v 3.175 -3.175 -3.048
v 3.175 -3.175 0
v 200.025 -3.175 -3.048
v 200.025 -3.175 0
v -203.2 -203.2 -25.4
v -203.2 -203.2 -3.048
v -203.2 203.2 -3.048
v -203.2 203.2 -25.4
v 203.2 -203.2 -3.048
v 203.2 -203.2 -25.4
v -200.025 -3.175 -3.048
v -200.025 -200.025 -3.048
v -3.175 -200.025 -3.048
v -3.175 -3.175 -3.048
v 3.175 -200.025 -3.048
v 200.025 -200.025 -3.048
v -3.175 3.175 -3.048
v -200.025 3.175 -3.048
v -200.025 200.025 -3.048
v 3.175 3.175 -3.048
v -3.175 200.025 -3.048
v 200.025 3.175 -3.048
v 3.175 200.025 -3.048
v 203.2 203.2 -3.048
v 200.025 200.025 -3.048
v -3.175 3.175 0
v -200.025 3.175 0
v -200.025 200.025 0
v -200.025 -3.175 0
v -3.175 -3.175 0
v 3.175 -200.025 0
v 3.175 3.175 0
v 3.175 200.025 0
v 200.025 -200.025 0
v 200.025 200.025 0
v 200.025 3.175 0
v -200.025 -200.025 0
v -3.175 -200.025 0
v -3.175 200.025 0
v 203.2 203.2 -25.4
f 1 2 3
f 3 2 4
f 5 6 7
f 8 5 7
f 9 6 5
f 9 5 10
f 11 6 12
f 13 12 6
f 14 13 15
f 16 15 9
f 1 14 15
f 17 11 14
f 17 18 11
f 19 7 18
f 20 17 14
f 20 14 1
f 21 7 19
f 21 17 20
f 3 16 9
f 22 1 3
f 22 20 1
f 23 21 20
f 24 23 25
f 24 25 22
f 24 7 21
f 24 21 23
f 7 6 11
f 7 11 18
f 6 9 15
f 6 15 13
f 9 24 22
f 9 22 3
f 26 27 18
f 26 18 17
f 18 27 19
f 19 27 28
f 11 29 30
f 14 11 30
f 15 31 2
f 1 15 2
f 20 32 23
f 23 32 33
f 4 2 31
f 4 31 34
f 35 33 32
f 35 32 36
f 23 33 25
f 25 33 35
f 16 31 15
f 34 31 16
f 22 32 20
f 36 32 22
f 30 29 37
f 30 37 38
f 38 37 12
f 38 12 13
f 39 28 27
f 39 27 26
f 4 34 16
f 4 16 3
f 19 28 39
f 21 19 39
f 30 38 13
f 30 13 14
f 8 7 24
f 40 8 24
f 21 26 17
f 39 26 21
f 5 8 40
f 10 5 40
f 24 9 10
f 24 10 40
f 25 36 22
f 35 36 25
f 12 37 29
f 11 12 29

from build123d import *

# Parameters (mm, degrees)
F0_W     = 406.4
F0_H     = 406.4
F1_DEPTH = 25.4
F2_W     = 425.3633022308
F2_H     = 428.5580217838
F2_W_2   = 196.85
F2_H_2   = 196.85
F3_DEPTH = 3.048


# Not quite as in the source:
# - a feature names something its author has since deleted; it is built from what else it names


with BuildPart() as f1:
    # F0 (on Top) → F1 (new body)
    with BuildSketch(Plane.XY):
        Rectangle(F0_W, F0_H)
    extrude(amount=-F1_DEPTH)

    # F2 (on Top) → F3 (cut)
    with BuildSketch(Plane.XY):
        Rectangle(F2_W, F2_H)
        with Locations((-101.6, -101.6)):
            Rectangle(F2_W_2, F2_H_2, mode=Mode.SUBTRACT)
        with Locations((101.6, -101.6)):
            Rectangle(F2_W_2, F2_H_2, mode=Mode.SUBTRACT)
        with Locations((-101.6, 101.6)):
            Rectangle(F2_W_2, F2_H_2, mode=Mode.SUBTRACT)
        with Locations((101.6, 101.6)):
            Rectangle(F2_W_2, F2_H_2, mode=Mode.SUBTRACT)
    extrude(amount=-F3_DEPTH, mode=Mode.SUBTRACT)


solid = f1.part
